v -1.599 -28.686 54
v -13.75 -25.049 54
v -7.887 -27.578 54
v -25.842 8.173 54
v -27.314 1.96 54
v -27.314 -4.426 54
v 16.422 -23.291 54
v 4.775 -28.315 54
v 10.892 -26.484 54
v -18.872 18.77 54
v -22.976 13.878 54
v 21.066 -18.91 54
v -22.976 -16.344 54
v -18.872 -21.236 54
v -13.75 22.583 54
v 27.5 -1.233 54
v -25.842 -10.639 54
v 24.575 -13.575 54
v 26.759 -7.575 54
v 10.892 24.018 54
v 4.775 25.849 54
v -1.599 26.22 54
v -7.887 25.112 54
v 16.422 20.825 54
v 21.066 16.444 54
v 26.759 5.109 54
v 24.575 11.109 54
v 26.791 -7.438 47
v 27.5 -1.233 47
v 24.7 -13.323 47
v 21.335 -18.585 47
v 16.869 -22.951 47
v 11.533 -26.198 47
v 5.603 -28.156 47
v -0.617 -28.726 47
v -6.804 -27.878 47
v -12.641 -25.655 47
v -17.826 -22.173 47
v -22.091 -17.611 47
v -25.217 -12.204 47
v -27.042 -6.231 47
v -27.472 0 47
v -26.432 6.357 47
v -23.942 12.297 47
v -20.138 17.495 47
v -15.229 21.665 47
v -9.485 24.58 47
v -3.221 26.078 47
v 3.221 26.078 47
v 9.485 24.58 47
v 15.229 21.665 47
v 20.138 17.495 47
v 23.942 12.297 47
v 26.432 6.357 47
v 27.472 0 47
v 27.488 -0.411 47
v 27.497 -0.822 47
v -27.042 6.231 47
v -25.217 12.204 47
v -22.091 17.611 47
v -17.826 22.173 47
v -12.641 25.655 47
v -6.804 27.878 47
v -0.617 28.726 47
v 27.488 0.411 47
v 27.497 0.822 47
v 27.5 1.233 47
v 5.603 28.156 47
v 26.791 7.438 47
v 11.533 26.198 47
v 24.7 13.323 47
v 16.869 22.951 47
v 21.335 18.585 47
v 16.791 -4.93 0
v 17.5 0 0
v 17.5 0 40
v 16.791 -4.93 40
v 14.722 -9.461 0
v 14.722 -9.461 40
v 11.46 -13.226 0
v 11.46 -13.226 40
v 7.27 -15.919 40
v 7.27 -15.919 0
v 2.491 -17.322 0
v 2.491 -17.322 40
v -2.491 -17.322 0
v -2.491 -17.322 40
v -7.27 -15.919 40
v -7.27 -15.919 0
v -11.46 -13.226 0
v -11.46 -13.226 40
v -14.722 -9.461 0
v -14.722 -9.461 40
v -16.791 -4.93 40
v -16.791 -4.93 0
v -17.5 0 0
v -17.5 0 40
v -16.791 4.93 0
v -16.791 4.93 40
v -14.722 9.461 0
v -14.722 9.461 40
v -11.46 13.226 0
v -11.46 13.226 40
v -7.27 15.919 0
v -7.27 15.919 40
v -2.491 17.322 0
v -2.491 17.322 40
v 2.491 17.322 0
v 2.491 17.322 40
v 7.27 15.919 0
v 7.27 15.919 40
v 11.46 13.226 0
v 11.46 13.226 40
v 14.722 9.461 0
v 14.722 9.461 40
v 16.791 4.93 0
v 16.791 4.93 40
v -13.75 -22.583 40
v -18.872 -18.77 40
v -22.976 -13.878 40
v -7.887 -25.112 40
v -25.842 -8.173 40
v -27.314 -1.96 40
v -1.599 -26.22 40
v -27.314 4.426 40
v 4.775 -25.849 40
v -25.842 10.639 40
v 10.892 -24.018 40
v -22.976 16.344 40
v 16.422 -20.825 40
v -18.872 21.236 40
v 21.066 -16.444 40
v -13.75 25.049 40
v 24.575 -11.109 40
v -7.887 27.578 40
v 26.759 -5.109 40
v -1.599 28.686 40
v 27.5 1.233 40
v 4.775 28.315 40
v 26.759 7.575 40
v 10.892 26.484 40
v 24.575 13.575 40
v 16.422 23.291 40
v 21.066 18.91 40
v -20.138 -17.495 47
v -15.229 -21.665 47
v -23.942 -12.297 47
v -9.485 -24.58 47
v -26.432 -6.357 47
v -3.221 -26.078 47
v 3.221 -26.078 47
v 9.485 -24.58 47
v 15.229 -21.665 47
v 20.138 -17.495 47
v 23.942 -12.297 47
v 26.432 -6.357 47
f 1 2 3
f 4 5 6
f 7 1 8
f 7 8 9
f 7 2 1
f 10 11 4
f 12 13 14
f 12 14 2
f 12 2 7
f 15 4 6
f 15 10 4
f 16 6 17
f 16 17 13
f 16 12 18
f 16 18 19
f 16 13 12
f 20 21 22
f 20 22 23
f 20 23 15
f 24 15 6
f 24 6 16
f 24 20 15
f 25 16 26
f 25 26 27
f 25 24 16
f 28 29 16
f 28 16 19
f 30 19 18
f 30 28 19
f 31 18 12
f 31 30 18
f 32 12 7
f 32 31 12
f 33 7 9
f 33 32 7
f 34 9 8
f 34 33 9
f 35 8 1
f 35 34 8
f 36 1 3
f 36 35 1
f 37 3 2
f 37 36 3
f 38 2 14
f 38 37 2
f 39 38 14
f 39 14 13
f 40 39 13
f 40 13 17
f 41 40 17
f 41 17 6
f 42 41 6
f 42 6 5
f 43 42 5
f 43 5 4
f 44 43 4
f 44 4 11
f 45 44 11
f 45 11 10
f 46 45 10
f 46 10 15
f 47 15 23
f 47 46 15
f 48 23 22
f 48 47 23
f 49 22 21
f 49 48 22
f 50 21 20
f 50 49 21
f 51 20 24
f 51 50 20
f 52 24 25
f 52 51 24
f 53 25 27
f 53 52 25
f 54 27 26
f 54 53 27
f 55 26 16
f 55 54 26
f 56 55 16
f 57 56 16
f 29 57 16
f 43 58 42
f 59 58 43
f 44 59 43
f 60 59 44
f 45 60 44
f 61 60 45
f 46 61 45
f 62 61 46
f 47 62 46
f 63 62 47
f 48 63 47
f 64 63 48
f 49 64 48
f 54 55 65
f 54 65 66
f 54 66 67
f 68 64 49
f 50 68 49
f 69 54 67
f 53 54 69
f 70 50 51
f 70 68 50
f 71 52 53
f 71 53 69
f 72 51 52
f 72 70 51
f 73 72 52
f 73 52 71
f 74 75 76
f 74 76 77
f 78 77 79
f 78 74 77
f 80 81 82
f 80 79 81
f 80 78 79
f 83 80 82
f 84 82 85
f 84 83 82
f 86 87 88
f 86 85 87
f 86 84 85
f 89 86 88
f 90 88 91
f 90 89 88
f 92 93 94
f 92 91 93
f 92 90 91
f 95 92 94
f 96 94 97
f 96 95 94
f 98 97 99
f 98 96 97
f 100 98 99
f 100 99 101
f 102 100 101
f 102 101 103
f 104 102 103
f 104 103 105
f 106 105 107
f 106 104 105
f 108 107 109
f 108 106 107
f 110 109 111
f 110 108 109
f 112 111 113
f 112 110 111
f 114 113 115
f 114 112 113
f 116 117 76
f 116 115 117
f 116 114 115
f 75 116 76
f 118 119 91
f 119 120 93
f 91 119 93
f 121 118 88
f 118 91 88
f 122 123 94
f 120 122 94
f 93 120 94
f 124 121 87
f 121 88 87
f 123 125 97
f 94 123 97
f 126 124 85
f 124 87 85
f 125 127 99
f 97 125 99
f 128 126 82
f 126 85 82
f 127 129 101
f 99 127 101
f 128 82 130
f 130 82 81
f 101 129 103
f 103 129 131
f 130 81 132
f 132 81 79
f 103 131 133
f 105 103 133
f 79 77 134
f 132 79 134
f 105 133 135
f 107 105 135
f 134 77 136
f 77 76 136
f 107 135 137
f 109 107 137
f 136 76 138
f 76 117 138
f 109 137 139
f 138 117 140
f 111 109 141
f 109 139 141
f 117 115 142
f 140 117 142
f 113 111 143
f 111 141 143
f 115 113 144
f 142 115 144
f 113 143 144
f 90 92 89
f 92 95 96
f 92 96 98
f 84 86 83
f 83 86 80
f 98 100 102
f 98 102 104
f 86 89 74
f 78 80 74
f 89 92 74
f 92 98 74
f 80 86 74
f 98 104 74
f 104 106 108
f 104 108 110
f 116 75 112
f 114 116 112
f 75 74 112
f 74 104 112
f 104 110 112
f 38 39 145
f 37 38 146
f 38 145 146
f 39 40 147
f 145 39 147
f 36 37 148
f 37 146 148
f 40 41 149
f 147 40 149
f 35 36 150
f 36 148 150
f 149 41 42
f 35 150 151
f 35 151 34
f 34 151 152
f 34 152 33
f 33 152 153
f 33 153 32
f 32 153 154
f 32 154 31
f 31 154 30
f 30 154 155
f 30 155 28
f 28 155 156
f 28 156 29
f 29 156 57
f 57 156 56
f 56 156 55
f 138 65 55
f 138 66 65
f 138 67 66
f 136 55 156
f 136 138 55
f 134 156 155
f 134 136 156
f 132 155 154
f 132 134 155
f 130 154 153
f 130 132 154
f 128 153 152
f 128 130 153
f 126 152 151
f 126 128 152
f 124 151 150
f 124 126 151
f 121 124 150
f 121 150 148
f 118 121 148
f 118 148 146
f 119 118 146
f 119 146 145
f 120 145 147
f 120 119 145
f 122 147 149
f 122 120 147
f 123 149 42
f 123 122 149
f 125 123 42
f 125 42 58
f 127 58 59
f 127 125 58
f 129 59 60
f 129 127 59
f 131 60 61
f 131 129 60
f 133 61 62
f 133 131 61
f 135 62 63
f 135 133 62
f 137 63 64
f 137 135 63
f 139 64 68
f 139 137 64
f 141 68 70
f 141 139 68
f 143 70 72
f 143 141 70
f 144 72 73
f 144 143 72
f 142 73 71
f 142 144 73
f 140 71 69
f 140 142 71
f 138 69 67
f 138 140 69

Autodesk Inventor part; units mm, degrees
ref_plane "YZ Plane" through (0, 0, 0) normal (1, 0, 0) x (0, 1, 0)
ref_plane "XZ Plane" through (0, 0, 0) normal (0, 1, 0) x (-1, 0, 0)
ref_plane "XY Plane" through (0, 0, 0) normal (0, 0, 1) x (1, 0, 0)
sketch "스케치1" plane through (0, 0, 0) normal (0, 0, 1) x (1, 0, 0)
  circle A0 centre (0, 0) radius 17.5
  dimension "d0" = 35
extrude "돌출1" add sketch "스케치1" along normal blind 40
sketch "스케치2" plane through (0, 0, 40) normal (0, 0, 1) x (1, 0, 0)
  circle A0 centre (0, 1.233) radius 27.5
  point P0 (0, 0)
  dimension "d3" = 55
  dimension "d4" = 1.233
extrude "돌출2" add sketch "스케치2" along normal blind 7
sketch "스케치3" plane through (0, 1.233, 47) normal (0, 0, 1) x (1, 0, 0)
  circle A0 centre (0, -1.233) radius 17.5 construction
  circle A1 centre (0, -1.233) radius 17.5 construction
  circle A2 centre (0, -1.233) radius 17.5 construction
  circle A3 centre (0, -2.466) radius 27.5
  dimension "d7" = 1.233
  dimension "d8" = 55
extrude "돌출3" add sketch "스케치3" along normal blind 7
properties part number "input_shaft"
